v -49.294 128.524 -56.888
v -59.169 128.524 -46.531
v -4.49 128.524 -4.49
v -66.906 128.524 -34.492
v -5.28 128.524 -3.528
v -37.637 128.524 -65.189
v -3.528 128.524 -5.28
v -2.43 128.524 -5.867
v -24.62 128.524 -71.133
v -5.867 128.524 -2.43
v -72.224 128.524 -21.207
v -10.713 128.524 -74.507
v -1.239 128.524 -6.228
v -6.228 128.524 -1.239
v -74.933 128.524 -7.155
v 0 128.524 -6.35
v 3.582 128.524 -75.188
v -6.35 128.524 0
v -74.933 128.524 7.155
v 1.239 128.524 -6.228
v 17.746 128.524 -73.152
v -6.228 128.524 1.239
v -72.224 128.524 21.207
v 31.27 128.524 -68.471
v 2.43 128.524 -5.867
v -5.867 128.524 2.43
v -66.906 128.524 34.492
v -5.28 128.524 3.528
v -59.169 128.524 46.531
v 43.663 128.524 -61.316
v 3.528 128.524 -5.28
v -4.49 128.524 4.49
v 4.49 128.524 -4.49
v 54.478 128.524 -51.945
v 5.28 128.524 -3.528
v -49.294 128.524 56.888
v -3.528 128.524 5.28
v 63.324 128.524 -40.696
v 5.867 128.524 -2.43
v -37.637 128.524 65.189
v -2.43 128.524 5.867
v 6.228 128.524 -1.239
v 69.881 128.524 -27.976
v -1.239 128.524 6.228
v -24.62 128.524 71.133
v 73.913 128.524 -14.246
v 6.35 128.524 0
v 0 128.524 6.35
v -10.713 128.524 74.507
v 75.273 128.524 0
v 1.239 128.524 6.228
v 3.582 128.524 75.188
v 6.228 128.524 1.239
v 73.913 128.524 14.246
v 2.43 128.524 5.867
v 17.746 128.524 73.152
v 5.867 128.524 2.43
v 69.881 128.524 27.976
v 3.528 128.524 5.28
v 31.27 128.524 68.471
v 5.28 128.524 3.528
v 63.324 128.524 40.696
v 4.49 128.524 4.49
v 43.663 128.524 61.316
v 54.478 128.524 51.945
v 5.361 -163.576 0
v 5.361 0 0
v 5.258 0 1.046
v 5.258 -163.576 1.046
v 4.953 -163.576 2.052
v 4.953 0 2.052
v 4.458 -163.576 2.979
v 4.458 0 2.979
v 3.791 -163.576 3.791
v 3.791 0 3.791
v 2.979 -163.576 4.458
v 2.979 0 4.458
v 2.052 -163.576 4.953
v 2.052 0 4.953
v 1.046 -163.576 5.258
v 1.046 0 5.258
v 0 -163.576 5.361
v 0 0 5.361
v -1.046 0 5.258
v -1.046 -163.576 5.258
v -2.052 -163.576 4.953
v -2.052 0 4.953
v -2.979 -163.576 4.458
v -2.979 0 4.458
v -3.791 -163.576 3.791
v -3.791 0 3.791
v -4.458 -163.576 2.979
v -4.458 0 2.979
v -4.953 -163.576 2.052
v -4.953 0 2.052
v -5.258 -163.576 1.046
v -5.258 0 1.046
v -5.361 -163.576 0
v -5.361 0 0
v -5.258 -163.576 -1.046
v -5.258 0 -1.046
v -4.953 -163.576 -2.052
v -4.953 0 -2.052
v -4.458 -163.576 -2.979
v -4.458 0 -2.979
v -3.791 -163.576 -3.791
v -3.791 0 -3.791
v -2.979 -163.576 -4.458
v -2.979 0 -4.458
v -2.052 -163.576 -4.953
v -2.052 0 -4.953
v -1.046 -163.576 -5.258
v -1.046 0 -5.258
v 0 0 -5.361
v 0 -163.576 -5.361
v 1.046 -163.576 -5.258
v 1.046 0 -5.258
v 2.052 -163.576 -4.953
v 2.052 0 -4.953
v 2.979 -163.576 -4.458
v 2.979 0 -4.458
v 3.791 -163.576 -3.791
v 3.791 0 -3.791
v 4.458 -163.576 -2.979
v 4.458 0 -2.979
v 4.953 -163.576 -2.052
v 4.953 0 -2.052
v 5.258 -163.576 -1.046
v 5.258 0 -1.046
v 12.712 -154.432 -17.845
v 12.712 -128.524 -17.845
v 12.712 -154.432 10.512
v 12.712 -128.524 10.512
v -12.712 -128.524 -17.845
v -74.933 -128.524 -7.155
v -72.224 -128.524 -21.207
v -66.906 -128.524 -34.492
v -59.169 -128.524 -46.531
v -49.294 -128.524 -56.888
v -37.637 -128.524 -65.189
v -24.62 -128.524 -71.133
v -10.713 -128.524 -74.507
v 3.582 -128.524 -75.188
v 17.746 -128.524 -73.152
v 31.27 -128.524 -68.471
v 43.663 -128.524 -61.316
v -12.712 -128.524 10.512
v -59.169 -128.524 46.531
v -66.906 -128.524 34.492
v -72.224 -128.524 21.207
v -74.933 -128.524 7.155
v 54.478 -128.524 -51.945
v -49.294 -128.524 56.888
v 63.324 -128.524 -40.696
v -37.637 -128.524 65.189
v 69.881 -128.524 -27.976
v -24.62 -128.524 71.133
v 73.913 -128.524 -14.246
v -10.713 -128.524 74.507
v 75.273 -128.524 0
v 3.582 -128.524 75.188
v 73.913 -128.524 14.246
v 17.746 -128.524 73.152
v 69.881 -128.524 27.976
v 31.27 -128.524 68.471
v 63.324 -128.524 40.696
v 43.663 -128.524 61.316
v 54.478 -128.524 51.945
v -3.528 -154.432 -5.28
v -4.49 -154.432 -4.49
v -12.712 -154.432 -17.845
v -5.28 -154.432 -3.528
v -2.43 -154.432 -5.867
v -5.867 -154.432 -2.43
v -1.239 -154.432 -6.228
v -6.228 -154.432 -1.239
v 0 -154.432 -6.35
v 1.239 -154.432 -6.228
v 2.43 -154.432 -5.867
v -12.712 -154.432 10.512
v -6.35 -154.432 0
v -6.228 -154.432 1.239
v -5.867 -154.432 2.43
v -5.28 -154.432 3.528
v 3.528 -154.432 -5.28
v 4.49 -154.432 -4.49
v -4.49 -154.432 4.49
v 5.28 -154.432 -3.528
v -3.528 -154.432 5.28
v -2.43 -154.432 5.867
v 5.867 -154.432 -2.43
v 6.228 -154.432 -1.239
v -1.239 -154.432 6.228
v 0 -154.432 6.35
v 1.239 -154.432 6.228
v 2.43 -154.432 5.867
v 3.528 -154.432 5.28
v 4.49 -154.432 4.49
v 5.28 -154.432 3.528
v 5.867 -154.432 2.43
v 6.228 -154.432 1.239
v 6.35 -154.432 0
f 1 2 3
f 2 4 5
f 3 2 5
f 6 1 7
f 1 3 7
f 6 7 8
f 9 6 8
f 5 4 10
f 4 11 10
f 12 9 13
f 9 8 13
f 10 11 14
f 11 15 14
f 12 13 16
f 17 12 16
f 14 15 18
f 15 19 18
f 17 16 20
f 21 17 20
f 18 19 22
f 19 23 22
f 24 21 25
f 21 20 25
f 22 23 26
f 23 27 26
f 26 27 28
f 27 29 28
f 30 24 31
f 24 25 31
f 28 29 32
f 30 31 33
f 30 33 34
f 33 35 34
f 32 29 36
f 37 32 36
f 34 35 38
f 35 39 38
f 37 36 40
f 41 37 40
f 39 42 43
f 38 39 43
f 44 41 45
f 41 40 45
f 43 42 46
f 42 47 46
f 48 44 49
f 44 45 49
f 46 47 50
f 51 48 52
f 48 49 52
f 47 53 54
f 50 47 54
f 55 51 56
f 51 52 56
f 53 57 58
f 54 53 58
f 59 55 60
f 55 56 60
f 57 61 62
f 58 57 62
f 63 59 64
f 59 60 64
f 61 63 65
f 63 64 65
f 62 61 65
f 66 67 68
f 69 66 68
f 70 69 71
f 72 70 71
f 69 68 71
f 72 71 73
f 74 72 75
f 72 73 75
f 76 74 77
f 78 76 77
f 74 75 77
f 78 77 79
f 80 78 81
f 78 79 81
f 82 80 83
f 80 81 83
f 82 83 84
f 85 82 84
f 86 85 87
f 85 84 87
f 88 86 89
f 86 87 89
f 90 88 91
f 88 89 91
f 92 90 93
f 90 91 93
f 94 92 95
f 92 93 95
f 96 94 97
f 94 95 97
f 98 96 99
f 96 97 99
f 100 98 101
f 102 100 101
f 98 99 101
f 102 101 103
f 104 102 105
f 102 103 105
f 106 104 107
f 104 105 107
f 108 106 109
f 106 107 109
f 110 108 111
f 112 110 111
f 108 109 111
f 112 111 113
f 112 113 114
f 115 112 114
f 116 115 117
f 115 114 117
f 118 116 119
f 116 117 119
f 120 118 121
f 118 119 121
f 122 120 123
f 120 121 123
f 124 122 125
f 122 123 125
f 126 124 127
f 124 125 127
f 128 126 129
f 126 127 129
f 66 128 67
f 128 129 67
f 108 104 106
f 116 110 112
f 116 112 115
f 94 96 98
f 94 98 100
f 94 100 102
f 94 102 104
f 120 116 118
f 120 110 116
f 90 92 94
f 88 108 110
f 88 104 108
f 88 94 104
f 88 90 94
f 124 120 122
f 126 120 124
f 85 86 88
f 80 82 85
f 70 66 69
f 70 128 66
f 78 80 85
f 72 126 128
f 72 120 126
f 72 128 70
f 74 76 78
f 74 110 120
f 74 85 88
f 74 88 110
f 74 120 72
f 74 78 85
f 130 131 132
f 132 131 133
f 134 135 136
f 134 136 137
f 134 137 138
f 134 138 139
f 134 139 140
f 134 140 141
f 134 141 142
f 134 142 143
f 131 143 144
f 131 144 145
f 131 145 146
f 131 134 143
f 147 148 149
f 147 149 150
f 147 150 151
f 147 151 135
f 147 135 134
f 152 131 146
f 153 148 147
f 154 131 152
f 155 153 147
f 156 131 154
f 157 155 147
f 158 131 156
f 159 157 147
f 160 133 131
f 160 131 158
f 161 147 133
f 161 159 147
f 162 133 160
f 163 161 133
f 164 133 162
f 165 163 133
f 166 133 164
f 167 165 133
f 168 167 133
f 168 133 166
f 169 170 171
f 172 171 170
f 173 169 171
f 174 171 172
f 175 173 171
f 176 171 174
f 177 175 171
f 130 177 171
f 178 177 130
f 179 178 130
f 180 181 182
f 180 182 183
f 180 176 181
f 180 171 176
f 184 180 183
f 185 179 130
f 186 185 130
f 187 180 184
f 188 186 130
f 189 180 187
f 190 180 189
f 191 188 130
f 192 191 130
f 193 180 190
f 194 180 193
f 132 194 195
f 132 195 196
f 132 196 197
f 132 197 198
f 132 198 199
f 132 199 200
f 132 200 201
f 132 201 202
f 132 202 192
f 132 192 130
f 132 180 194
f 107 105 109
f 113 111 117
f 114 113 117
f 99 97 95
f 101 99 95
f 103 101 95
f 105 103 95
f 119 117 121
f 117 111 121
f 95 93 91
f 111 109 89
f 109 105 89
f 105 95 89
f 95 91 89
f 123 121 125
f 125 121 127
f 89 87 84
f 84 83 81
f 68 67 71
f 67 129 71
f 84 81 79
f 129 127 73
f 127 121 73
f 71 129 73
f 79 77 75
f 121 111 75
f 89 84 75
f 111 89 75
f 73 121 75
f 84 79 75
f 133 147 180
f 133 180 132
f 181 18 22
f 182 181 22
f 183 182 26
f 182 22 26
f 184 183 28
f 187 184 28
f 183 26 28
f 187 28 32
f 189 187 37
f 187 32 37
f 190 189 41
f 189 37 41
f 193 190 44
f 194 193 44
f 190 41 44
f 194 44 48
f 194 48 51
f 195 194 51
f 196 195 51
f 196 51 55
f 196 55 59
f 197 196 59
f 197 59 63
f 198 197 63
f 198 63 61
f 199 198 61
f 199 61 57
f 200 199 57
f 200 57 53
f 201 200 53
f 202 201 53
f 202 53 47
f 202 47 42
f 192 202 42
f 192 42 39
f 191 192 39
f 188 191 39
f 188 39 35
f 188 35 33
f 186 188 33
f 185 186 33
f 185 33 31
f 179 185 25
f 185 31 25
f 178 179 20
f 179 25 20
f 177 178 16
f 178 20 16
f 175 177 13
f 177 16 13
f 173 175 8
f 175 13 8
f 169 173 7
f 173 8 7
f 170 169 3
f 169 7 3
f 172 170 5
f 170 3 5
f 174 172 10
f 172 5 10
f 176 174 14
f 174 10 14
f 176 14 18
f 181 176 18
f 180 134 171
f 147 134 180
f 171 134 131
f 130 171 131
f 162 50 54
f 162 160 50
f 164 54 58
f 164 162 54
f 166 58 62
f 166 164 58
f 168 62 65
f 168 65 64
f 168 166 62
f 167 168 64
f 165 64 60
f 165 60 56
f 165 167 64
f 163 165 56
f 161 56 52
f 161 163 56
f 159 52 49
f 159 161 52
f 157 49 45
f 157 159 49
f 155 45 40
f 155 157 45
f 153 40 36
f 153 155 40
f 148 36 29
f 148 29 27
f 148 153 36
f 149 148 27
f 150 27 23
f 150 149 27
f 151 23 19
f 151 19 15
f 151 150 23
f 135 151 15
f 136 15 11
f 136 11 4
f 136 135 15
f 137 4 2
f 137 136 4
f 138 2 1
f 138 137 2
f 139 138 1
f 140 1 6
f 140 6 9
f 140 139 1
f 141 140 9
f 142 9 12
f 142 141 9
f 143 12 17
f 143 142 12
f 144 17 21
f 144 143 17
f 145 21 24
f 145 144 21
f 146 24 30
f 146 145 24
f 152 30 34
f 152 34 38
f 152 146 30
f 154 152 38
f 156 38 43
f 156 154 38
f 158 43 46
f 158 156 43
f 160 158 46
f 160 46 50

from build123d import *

# Parameters (mm, degrees)
F0_R     = 75.273394
F1_DEPTH = 128.524
F2_W     = 25.423282
F2_H     = 28.356747
F3_DEPTH = 154.432
F5_D     = 12.7
F6_R     = 5.361316
F7_DEPTH = 163.576


with BuildPart() as f1:
    # F0 (on Front) → F1 (new body, symmetric)
    with BuildSketch(Plane.XZ):
        Circle(F0_R)
    extrude(amount=F1_DEPTH, both=True)

    # F2 (on Front) → F3 (join)
    with BuildSketch(Plane.XZ):
        with Locations((0, -3.666822)):
            Rectangle(F2_W, F2_H)
    extrude(amount=F3_DEPTH)

    # F5 (through all)
    with Locations(Plane.XZ.offset(154.432)):
        with Locations((0, 0)):
            Hole(F5_D / 2)


with BuildPart() as f7:
    # F6 (on Front) → F7 (new body)
    with BuildSketch(Plane.XZ):
        Circle(F6_R)
    extrude(amount=F7_DEPTH)


solid = Compound([f1.part, f7.part])
